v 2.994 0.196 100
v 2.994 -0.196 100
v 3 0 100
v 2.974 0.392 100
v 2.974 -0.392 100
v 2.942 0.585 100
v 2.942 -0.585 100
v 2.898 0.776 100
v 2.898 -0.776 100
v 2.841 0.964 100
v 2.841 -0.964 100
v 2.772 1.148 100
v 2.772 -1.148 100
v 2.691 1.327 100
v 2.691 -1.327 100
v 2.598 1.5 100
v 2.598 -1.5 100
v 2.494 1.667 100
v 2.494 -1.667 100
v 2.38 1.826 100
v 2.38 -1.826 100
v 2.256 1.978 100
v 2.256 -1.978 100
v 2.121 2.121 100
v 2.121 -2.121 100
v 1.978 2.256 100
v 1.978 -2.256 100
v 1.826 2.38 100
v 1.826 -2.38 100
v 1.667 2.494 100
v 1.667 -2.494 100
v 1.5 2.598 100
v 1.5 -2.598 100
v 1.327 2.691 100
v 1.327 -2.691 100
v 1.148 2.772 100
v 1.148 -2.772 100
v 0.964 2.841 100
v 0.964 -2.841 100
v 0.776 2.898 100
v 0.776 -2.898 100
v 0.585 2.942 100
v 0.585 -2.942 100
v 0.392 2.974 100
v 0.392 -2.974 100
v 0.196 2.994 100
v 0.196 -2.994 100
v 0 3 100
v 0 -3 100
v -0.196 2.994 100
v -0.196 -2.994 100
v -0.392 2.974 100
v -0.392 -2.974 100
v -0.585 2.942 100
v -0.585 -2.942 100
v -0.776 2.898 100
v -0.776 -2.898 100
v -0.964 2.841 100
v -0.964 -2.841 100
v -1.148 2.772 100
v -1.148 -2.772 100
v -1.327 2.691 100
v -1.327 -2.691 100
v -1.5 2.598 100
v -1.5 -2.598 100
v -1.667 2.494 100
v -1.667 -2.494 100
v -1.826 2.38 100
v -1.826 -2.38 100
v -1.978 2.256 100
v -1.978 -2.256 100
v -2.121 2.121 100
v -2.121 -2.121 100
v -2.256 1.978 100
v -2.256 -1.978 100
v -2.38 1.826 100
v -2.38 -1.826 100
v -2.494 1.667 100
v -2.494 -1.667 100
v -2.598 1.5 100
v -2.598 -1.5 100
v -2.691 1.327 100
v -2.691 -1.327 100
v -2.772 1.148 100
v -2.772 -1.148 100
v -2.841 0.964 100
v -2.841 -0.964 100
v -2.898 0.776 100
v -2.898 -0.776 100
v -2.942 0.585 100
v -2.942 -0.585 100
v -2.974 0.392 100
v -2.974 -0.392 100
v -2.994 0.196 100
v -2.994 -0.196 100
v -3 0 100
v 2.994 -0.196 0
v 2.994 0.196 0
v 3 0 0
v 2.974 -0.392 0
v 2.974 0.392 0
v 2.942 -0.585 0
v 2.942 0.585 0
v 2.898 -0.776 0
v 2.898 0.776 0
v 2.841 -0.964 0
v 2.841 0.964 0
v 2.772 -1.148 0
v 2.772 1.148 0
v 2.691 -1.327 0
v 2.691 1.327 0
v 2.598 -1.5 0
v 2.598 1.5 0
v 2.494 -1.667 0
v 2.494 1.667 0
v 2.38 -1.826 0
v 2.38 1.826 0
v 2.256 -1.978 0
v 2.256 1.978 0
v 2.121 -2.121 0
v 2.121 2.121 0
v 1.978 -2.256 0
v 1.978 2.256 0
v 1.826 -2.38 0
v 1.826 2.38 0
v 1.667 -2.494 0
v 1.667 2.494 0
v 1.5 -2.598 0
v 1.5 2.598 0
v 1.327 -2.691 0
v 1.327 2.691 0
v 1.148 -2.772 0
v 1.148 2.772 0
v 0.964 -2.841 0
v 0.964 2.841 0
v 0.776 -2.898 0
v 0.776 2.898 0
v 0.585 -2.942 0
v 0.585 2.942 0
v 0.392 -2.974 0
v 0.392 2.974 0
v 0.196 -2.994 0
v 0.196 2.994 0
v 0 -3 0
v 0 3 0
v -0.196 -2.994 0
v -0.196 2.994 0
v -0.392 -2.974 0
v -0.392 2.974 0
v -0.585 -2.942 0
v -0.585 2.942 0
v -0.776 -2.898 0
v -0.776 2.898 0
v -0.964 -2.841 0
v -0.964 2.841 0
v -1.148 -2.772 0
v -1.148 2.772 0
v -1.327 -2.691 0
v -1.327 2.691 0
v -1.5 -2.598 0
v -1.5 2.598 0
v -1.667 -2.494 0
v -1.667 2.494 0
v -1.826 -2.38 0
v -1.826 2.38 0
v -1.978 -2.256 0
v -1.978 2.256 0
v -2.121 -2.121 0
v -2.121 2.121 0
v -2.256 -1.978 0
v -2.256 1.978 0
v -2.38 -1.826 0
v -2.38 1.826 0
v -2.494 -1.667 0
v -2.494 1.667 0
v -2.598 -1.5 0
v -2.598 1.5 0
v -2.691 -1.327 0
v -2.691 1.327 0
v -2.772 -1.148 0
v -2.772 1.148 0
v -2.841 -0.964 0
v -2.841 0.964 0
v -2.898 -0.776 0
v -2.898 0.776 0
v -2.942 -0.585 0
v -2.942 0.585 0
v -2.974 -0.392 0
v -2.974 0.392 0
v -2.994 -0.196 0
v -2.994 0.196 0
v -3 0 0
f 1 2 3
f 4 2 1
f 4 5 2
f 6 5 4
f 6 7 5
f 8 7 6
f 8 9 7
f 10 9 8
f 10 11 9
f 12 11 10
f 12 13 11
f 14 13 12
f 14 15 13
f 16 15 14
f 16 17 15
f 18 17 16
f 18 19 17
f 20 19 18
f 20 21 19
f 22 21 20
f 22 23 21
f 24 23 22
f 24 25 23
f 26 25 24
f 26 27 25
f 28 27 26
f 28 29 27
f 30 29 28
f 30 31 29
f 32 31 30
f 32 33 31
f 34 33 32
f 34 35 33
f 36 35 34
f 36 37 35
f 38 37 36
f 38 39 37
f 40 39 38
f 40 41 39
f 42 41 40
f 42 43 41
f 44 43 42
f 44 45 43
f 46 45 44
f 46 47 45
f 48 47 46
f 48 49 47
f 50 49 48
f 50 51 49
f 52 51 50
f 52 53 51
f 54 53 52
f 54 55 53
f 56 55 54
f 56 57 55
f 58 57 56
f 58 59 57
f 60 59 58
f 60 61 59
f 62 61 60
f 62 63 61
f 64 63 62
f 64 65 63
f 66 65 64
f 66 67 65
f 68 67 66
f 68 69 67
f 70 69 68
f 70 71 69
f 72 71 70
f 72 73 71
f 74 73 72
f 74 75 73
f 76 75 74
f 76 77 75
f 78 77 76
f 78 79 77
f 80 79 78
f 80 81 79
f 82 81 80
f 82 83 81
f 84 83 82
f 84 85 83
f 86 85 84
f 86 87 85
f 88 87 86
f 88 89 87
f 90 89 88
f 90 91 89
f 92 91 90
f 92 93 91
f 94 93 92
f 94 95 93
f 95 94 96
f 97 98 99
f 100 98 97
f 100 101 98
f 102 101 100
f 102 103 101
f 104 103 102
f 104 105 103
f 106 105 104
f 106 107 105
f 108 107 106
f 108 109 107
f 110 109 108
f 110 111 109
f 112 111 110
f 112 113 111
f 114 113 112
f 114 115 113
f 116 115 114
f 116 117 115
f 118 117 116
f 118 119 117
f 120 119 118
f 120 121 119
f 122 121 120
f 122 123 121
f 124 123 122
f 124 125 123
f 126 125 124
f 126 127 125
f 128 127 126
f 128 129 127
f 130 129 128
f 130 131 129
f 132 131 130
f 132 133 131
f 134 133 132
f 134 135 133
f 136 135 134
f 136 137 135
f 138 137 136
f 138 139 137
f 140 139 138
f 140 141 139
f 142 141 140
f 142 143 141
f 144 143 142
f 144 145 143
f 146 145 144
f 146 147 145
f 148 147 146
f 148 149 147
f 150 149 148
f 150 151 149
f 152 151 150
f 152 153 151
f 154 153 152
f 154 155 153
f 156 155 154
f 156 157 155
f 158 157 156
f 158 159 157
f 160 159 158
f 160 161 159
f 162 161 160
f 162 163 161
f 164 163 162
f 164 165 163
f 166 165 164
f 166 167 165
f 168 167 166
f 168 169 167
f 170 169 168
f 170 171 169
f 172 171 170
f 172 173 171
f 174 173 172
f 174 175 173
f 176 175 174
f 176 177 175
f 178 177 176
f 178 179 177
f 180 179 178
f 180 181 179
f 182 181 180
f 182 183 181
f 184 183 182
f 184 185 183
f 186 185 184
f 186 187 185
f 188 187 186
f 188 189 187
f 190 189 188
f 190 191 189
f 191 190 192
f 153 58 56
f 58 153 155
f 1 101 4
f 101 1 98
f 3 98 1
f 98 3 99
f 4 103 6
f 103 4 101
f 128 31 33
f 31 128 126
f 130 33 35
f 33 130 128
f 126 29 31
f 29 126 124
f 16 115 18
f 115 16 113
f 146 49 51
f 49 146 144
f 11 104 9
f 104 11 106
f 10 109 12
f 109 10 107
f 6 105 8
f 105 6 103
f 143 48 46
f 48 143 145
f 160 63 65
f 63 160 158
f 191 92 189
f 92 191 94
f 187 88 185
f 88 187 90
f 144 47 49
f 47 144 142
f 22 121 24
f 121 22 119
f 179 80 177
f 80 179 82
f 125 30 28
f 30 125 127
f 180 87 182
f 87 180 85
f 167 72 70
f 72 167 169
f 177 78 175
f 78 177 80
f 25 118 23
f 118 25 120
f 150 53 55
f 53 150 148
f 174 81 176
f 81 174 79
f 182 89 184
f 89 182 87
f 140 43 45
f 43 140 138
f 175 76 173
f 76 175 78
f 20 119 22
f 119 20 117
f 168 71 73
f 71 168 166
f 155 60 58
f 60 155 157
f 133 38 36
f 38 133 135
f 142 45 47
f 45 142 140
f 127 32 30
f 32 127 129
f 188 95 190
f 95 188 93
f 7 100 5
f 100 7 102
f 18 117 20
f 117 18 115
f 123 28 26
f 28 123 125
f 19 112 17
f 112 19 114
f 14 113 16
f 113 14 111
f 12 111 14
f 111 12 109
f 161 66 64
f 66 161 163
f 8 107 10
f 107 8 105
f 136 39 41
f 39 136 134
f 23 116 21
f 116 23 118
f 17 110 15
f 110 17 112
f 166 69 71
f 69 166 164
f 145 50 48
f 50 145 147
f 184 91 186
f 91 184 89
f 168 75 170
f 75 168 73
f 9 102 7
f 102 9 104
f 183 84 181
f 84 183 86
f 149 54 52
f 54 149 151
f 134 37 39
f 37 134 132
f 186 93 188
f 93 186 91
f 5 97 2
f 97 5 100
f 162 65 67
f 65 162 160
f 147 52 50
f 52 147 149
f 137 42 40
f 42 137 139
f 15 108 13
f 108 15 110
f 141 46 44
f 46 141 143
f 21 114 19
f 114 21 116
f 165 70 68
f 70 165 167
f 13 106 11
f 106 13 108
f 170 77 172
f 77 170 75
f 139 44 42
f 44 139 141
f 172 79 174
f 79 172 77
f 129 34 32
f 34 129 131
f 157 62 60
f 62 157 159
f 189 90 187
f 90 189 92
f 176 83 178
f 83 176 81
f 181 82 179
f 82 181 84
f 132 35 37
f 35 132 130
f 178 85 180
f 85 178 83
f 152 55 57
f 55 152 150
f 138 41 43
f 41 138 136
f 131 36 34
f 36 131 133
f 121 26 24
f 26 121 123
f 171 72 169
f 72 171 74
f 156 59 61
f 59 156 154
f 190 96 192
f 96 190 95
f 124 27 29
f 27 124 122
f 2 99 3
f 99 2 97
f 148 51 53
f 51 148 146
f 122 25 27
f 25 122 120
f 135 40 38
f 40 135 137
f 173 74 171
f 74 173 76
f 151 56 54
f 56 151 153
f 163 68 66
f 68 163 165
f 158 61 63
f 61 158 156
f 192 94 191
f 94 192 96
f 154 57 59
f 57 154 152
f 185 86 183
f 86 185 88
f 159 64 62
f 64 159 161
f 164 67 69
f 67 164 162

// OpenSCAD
p0_radius = 10.0;
p0_length = 100.0;
p1_outer_radius = 10.0;
p1_inner_radius = 3.0;
p1_length = 100.0;

module part_0() {
  cylinder(r=p0_radius, h=p0_length, $fn=96);
}

module part_1() {
  difference() {
    cylinder(r=p1_outer_radius, h=p1_length, $fn=96);
    translate([0, 0, -0.01]) cylinder(r=p1_inner_radius, h=p1_length + 0.02, $fn=96);
  }
}

difference() {
  part_0();
  part_1();
}
